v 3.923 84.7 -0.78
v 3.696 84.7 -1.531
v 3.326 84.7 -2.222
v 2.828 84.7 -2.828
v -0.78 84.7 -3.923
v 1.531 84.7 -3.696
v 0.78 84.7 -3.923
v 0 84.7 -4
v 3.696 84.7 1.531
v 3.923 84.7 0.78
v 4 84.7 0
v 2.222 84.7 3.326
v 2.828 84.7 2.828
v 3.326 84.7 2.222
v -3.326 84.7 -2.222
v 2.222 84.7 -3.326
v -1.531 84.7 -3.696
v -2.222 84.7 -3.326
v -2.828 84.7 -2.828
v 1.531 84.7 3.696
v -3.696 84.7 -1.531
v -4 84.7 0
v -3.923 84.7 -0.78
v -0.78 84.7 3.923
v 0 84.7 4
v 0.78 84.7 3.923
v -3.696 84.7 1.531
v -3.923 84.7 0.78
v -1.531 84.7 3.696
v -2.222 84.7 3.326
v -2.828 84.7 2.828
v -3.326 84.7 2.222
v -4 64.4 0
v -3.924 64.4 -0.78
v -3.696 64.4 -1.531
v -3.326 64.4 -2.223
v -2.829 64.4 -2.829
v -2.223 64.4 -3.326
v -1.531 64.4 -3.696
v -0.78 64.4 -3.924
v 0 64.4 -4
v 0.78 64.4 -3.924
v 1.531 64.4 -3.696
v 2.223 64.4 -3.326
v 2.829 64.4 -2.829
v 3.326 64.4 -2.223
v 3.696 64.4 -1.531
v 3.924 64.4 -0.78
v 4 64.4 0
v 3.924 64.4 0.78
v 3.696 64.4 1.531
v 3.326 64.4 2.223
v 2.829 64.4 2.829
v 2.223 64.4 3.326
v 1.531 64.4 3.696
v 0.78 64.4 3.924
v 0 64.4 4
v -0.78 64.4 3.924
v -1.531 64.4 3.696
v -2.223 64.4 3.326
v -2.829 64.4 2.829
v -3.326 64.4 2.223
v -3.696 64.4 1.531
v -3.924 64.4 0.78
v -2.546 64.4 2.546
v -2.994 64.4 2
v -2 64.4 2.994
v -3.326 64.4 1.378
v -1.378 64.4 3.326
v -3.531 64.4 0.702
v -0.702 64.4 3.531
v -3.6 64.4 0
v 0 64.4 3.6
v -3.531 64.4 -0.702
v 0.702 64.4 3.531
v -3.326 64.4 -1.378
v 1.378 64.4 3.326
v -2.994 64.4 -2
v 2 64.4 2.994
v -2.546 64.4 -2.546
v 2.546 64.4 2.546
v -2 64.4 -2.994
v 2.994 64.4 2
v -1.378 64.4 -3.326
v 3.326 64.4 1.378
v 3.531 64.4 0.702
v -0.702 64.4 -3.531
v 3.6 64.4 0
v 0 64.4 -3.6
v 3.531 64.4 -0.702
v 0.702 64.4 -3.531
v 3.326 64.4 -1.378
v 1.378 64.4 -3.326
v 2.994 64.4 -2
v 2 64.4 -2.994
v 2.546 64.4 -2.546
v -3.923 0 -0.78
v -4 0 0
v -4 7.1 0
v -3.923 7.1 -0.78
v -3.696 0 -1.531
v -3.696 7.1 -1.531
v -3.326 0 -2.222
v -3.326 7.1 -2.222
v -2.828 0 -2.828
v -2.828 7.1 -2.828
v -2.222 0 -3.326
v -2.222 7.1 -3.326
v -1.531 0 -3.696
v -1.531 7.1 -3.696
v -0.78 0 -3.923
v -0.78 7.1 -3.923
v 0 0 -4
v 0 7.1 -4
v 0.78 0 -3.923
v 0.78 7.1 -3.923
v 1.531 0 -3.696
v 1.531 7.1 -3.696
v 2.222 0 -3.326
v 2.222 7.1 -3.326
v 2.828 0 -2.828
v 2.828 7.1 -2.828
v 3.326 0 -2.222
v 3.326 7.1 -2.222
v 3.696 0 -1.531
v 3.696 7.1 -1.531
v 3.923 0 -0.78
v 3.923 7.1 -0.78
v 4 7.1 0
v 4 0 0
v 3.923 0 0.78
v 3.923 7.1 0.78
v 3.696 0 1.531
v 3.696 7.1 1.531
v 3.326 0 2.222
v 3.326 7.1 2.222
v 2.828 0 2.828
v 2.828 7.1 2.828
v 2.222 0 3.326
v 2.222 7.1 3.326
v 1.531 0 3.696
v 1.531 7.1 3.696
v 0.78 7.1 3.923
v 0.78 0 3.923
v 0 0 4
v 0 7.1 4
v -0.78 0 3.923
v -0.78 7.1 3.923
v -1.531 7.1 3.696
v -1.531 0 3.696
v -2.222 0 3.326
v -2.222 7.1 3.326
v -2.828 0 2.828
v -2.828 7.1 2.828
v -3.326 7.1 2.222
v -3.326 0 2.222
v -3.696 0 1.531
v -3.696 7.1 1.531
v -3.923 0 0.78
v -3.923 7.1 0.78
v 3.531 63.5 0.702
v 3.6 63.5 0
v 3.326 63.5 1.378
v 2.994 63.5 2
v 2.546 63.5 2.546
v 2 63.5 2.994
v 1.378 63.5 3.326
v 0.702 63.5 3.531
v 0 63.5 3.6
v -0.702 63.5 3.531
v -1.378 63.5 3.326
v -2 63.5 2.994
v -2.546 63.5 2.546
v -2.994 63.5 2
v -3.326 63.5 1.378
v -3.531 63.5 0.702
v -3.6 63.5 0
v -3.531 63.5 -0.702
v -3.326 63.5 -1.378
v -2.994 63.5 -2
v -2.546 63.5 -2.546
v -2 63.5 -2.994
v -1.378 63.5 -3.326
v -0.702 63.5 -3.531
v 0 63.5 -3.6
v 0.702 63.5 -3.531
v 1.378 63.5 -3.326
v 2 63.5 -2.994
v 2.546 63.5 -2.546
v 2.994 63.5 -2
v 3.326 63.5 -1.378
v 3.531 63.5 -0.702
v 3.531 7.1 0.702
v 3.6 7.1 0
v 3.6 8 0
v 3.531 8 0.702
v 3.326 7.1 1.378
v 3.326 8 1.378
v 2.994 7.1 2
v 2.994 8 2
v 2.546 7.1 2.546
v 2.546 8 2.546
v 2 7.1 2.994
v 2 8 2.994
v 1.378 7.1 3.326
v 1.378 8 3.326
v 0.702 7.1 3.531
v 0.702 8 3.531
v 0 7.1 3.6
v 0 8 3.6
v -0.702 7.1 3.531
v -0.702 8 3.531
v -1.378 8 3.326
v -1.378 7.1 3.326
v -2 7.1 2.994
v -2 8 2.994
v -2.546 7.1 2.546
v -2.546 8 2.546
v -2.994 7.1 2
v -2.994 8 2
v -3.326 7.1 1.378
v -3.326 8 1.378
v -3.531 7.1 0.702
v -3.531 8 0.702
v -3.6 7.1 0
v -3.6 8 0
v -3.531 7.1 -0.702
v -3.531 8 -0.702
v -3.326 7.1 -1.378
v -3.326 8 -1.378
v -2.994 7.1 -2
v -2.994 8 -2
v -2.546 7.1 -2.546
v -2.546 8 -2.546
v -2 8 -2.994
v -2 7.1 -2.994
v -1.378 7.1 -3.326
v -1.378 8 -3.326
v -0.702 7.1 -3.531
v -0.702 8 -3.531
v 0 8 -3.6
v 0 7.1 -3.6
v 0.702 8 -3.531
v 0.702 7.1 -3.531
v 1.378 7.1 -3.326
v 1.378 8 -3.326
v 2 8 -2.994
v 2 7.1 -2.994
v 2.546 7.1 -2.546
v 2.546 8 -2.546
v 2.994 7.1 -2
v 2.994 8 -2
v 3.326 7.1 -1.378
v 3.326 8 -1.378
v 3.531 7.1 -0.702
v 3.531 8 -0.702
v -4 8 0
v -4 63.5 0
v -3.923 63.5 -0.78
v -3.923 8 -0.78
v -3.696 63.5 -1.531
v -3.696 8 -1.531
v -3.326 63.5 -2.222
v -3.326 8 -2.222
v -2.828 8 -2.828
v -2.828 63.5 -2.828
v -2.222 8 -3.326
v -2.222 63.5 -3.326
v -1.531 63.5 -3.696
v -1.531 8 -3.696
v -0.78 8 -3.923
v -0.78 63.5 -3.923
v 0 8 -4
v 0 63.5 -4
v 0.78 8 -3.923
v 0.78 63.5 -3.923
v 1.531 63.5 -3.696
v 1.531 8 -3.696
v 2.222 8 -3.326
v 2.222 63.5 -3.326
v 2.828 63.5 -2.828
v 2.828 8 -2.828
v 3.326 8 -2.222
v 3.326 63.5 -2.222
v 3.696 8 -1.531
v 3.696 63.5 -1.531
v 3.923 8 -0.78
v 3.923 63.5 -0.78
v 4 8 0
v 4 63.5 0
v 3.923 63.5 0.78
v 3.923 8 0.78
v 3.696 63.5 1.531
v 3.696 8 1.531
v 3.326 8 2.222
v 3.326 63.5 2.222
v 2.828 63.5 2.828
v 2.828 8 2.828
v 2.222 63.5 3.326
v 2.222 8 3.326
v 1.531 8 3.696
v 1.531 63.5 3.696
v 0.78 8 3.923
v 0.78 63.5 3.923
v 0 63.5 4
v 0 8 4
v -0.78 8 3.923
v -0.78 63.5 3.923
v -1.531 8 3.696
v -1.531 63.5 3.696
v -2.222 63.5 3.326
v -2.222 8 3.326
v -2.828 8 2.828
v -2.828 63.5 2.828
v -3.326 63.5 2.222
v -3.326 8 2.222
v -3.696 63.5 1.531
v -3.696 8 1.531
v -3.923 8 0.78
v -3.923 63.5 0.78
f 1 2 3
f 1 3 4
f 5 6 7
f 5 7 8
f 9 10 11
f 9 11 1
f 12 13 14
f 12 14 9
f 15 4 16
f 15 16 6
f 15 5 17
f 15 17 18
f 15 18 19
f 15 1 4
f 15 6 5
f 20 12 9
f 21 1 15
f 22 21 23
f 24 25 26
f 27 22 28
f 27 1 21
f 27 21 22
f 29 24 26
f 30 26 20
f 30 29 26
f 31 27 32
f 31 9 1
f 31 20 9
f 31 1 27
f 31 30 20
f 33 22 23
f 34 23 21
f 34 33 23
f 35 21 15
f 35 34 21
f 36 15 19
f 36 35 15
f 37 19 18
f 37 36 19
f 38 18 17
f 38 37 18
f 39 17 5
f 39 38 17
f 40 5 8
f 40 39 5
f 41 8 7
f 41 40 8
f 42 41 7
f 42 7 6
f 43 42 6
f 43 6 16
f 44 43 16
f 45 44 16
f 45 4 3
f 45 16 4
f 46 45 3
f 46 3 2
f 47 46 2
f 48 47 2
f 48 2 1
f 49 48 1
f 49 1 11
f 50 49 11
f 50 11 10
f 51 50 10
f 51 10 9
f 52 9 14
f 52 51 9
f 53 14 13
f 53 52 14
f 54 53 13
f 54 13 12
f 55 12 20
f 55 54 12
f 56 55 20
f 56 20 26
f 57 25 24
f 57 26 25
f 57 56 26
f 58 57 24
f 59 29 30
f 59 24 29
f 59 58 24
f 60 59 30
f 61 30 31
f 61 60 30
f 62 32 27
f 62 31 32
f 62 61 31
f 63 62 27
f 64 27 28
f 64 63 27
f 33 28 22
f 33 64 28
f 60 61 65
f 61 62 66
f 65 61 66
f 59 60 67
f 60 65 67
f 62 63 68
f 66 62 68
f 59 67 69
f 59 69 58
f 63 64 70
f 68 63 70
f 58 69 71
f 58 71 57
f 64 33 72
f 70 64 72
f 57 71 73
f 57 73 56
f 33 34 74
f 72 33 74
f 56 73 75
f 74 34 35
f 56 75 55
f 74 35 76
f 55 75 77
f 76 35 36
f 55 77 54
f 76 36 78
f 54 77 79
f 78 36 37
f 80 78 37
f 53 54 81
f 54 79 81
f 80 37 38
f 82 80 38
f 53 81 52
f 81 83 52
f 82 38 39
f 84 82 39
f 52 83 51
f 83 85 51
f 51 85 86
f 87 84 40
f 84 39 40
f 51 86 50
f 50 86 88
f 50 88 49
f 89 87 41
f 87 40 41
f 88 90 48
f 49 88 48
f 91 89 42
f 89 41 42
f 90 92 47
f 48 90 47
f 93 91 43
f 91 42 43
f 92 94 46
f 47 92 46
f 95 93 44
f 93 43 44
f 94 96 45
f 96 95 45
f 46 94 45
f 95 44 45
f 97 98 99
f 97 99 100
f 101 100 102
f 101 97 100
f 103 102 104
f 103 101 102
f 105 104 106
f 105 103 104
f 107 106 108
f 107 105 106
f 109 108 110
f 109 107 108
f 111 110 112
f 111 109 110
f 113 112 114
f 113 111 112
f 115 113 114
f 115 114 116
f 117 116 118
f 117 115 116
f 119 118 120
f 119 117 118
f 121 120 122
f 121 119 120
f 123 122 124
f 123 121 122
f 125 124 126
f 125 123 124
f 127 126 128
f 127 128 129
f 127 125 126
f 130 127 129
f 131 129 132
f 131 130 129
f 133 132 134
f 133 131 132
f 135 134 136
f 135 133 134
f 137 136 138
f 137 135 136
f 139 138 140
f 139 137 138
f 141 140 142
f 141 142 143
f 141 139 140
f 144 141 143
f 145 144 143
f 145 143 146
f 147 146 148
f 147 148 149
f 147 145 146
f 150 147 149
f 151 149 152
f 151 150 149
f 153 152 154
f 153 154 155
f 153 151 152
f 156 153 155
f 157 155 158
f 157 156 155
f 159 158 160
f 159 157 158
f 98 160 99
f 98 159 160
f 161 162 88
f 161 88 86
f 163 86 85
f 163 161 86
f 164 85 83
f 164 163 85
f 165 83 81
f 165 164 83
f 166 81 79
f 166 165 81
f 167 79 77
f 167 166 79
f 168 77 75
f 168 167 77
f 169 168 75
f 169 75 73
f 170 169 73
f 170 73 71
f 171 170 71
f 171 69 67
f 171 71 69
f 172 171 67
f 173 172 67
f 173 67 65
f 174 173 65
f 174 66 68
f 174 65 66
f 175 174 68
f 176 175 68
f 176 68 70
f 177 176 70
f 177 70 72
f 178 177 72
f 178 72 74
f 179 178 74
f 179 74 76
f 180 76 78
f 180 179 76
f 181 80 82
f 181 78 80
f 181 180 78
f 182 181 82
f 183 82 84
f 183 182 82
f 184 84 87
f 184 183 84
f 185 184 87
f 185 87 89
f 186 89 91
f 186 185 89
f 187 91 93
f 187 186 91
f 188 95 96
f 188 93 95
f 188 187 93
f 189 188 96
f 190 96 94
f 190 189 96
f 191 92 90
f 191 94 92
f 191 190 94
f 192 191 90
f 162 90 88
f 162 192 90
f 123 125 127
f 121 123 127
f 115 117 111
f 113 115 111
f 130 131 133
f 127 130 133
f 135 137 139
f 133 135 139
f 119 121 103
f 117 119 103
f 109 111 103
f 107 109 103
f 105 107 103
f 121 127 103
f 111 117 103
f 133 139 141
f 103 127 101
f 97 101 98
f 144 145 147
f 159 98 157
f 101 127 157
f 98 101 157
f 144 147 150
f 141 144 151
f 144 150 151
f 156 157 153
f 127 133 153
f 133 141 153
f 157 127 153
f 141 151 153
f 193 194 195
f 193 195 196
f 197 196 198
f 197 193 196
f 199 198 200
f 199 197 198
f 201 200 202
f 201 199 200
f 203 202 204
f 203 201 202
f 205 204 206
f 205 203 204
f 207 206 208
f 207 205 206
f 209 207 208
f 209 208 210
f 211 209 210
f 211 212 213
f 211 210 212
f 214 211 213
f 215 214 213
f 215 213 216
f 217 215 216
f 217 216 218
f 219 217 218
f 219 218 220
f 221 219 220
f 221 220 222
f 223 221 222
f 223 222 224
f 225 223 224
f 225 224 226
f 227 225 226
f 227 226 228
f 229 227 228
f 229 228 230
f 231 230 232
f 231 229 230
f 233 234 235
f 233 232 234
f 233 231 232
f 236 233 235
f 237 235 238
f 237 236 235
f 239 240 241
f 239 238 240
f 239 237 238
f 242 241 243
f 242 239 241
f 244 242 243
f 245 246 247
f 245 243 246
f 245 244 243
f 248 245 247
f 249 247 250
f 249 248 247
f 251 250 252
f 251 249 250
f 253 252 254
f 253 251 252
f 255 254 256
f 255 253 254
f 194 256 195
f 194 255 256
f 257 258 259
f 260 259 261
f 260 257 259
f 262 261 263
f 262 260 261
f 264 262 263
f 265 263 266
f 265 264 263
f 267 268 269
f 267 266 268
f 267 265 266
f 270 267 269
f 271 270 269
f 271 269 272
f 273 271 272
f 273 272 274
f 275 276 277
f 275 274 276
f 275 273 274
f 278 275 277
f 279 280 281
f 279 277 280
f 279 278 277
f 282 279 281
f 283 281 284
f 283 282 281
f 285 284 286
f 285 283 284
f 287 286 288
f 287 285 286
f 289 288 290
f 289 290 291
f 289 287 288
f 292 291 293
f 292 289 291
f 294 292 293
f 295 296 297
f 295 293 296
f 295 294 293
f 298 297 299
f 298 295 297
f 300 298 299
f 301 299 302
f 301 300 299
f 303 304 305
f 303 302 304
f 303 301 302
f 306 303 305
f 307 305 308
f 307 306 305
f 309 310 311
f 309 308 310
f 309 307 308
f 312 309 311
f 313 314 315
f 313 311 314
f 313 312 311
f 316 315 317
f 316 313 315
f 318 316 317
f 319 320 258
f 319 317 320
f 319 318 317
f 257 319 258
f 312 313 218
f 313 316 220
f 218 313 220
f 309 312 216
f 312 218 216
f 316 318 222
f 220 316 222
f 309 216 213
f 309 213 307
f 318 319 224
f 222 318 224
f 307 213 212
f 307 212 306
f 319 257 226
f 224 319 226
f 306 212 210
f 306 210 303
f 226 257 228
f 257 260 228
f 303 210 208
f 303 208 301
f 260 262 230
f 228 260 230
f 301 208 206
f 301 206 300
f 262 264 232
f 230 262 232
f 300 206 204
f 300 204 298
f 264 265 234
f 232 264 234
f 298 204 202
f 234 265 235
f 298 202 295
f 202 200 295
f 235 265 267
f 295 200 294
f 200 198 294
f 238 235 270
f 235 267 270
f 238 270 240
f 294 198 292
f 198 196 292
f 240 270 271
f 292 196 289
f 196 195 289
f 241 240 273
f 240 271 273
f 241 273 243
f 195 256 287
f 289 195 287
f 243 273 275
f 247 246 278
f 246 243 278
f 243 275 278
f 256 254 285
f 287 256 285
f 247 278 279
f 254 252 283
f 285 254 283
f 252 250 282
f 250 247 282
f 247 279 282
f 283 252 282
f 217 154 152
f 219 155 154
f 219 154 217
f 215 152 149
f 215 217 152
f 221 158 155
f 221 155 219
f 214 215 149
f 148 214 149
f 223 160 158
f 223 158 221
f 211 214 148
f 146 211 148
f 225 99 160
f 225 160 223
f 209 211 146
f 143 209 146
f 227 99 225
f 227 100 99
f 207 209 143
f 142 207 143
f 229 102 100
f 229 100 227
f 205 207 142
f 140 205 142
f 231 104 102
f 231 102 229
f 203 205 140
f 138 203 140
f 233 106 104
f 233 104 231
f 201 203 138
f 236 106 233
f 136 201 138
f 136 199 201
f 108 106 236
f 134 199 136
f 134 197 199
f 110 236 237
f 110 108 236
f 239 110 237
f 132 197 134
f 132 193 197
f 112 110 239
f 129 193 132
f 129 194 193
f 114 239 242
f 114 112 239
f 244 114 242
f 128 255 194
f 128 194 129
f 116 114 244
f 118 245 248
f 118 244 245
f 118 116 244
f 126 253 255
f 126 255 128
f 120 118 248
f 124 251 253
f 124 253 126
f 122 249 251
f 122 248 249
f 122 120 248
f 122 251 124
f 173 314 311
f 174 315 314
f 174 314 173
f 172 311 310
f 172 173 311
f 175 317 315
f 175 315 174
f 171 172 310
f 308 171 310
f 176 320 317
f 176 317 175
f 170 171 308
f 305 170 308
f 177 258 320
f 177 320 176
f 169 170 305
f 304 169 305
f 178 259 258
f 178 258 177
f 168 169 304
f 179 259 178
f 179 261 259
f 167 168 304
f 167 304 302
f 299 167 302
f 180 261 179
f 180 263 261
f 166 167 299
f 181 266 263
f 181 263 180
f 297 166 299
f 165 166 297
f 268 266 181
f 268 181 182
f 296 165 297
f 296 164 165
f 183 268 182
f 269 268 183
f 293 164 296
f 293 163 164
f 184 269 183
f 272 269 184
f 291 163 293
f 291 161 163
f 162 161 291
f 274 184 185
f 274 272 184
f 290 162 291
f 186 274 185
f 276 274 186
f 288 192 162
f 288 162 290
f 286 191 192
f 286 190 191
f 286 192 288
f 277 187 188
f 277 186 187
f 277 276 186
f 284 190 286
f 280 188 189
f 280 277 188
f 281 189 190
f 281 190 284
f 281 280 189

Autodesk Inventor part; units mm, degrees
ref_plane "YZ Plane" through (0, 0, 0) normal (1, 0, 0) x (0, 1, 0)
ref_plane "XZ Plane" through (0, 0, 0) normal (0, 1, 0) x (-1, 0, 0)
sketch "Sketch1" plane through (0, 0, 0) normal (0, 1, 0) x (-1, 0, 0)
  circle A0 centre (0, 0) radius 4
  dimension "d0" = 8
extrude "Extrusion1" add sketch "Sketch1" along normal blind 84.7
ref_plane "Work Plane2" through (0, 63.5, 0) normal (0, -1, 0) x (1, 0, 0)
ref_plane "Work Plane1" through (0, 8, 0) normal (0, -1, 0) x (1, 0, 0)
sketch "Sketch3" plane through (0, 0, 0) normal (0, 0, 1) x (1, 0, 0)
  line L0 (4, 84.7) -> (-4, 84.7) projected
  line L1 (4, 0) -> (-4, 0) projected
  line L2 (4, 84.7) -> (-4, 84.7) projected
  line L3 (4, 0) -> (-4, 0) projected
  line L4 (4, 63.5) -> (-4, 63.5)
  line L5 (3.6004, 63.5) -> (4.0004, 63.5)
  line L6 (4.0004, 63.5) -> (4.0004, 64.4)
  line L7 (4.0004, 64.4) -> (3.6004, 64.4)
  line L8 (3.6004, 64.4) -> (3.6004, 63.5)
  line L9 (0, -16.94) -> (0, 101.64) projected
  line L10 (-4, 8) -> (4.0004, 8)
  line L11 (4.0004, 8) -> (3.6004, 8)
  line L12 (3.6004, 8) -> (3.6004, 7.1)
  line L13 (3.6004, 7.1) -> (4.0004, 7.1)
  line L14 (4.0004, 7.1) -> (4.0004, 8)
  point P0 (0, 0)
  dimension "d7" = 63.5
  dimension "d8" = 0.4
  dimension "d9" = 0.9
  dimension "d12" = 8
  dimension "d13" = 0.4
  dimension "d14" = 0.9
revolve "Revolution2" cut sketch "Sketch3" angle 360 about axis through (0, -10, 0) along (0, 1, 0)
properties part number "FlipperRoundShaft"
